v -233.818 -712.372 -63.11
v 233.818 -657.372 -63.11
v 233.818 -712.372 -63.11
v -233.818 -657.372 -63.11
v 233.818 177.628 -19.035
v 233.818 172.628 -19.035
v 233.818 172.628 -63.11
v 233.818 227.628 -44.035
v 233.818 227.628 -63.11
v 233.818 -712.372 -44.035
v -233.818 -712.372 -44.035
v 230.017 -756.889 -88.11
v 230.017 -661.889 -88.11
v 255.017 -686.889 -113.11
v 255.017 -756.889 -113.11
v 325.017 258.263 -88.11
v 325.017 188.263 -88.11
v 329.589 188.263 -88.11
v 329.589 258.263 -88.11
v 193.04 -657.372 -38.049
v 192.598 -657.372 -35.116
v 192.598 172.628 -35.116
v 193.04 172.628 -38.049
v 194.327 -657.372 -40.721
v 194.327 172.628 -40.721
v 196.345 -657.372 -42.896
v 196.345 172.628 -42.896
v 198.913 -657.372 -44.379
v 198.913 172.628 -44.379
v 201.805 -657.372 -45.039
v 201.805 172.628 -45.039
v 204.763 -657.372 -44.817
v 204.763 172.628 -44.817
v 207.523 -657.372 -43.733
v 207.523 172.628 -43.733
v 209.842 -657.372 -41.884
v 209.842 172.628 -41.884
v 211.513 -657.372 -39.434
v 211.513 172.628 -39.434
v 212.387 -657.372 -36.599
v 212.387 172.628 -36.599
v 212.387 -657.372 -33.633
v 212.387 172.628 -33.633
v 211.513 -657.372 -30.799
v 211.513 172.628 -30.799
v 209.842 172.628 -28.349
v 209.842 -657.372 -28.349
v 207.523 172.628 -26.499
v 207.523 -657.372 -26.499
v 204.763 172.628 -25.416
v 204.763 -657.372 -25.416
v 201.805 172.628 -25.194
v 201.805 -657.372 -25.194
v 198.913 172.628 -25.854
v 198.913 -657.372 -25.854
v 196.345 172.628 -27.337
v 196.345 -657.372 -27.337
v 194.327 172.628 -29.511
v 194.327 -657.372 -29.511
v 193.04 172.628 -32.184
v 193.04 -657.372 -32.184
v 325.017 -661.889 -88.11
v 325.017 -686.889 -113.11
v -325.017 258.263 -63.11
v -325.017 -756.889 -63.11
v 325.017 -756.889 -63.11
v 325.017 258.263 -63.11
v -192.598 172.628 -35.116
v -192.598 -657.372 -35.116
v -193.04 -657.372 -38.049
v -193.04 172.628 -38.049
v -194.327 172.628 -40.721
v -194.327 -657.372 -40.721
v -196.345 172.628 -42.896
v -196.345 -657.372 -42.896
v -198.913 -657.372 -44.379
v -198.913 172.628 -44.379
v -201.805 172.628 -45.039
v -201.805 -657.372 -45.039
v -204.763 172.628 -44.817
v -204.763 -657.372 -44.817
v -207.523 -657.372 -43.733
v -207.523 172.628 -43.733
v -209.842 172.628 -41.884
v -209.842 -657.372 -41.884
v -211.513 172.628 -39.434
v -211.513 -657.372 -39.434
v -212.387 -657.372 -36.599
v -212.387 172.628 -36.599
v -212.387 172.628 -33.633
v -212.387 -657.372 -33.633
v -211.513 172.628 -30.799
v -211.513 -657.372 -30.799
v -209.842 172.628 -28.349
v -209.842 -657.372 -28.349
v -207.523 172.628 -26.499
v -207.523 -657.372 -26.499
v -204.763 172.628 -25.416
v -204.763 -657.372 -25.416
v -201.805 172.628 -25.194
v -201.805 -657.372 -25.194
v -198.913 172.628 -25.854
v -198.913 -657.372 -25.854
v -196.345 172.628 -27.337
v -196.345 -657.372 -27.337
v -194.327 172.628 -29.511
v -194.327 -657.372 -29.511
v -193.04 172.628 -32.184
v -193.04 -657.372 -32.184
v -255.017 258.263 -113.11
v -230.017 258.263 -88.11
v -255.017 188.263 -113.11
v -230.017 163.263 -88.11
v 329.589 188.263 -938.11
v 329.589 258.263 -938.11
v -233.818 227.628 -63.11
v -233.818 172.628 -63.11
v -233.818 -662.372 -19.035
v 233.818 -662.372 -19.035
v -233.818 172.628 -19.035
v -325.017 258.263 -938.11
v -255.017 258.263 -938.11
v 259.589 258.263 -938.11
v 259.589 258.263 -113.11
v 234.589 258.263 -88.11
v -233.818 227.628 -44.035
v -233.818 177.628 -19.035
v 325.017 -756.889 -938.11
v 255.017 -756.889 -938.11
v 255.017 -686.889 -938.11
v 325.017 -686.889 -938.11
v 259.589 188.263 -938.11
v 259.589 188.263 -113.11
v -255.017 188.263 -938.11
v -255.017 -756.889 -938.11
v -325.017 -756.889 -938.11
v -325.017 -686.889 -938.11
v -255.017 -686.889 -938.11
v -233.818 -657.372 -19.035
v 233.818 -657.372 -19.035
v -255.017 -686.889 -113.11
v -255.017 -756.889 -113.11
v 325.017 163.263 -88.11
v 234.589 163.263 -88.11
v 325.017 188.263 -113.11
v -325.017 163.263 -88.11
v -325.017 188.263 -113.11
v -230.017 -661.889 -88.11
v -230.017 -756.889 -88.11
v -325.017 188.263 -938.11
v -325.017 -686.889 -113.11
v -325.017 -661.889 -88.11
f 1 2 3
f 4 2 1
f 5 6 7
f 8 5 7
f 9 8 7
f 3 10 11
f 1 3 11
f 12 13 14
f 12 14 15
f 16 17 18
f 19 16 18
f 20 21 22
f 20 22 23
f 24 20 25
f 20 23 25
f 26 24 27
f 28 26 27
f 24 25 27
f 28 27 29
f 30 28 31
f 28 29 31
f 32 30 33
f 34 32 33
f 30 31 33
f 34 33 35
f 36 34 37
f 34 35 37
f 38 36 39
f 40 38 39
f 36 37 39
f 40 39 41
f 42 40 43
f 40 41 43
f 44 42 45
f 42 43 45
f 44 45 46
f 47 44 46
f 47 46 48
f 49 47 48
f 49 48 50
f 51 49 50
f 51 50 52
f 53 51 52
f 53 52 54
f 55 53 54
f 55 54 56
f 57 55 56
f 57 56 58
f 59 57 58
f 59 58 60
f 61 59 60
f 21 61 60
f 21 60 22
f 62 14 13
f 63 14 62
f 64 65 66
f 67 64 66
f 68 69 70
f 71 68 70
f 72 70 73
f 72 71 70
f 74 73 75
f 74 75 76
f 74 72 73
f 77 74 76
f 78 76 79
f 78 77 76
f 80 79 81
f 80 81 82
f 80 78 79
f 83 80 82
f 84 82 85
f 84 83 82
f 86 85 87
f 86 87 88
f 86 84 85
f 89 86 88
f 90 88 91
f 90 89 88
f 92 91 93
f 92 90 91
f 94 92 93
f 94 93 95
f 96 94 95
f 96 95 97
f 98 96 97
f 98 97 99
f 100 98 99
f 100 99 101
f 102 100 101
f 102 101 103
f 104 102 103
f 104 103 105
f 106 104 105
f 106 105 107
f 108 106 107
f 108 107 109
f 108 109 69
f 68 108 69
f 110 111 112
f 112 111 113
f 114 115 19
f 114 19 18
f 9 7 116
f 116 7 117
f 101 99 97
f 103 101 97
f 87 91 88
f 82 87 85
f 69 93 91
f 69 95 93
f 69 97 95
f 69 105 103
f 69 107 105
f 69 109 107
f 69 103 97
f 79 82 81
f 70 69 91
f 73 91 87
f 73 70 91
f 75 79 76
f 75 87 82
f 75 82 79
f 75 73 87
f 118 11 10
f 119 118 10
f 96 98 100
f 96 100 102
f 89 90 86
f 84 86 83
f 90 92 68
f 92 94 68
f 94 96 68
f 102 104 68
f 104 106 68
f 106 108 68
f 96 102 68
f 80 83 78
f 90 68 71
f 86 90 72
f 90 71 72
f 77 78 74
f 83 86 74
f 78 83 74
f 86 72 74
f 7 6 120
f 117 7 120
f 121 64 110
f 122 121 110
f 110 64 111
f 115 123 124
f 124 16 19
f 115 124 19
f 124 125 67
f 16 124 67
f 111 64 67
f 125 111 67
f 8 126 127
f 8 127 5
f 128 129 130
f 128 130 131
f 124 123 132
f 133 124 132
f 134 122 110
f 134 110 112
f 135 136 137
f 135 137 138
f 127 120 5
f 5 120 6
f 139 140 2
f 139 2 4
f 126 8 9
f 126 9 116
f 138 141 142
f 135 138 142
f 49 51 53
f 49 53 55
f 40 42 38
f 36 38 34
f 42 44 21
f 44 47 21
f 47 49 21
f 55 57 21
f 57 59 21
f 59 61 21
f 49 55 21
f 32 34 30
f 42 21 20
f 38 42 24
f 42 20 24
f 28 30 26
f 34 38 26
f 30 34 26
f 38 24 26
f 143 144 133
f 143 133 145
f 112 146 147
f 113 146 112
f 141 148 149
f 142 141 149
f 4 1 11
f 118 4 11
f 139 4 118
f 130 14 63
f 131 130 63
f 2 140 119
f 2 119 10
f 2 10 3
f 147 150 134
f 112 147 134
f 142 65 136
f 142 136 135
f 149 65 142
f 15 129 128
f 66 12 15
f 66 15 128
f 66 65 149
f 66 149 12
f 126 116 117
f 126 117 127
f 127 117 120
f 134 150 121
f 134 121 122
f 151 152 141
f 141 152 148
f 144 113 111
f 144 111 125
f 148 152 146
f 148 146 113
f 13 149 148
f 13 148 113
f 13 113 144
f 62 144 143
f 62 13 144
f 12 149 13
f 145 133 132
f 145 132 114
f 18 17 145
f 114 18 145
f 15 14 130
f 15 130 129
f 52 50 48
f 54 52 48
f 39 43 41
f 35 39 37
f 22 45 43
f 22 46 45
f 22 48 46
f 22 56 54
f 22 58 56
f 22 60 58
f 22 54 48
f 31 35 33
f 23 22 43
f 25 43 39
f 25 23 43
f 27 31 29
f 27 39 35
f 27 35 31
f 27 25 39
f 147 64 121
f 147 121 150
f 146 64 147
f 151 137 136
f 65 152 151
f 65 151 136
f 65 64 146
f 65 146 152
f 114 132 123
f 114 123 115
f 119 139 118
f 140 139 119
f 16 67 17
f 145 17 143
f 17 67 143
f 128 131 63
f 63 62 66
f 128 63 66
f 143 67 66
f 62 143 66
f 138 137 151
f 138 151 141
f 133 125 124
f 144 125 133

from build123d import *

# Parameters (mm, degrees)
F0_R      = 9.95
F7_DEPTH  = 55
F8_SIZE2  = 25
F8_SIZE   = 50
F10_W     = 650.0343084335
F10_H     = 1015.1521861553
F11_DEPTH = 25
F12_W     = 70
F12_H     = 70
F13_DEPTH = 850
F14_SIZE  = 25


with BuildPart() as f4:
    # F4: sweep along a path in F3
    with BuildLine(Plane.YZ.offset(-202.5484293699)) as f4_path:
        Line((-657.3717359189, -35.4168222417), (0, -35.4168222417))
        Line((0, -35.4168222417), (172.6282640811, -35.4168222417))
    # F0 (on Front) → F4 (sweep)
    with BuildSketch(Plane.XZ):
        with Locations((-202.5484293699, -35.1164080203)):
            Circle(F0_R)
    sweep(path=f4_path.line)


with BuildPart() as f5_1:
    # F5: instance of F4
    add(f4.part.mirror(Plane.YZ))


with BuildPart() as f7:
    # F6 (on face) → F7 (new body)
    with BuildSketch(Plane(origin=(0, 172.6282640811, 0), x_dir=(-1, 0, 0), z_dir=(0, 1, 0))):
        Polygon((0, -19.0347600728), (-233.8182926178, -19.0347600728), (-233.8182926178, -63.1103813648), (0, -63.1103813648), (233.8182926178, -63.1103813648), (233.8182926178, -19.0347600728), align=None)
    extrude(amount=F7_DEPTH)

    # F8
    f8_edges = [f7.edges().sort_by_distance(p)[0] for p in [
        (0, 227.628264, -19.03476),
    ]]
    f8_side = f7.faces().sort_by_distance((0, 200.128264, -19.03476))[0]
    chamfer(f8_edges, length=F8_SIZE, length2=F8_SIZE2, reference=f8_side)


with BuildPart() as f9_1:
    # F9: instance of F7
    add(f7.part.mirror(Plane.XZ.offset(242.372)))


with BuildPart() as f11:
    # F10 (on face) → F11 (new body)
    with BuildSketch(Plane(origin=(0, 0, -63.1103813648), x_dir=(1, 0, 0), z_dir=(0, 0, -1))):
        with Locations((0, 249.3127137423)):
            Rectangle(F10_W, F10_H)
    extrude(amount=F11_DEPTH)

    # F12 (on face) → F13 (join)
    with BuildSketch(Plane(origin=(0, 0, -88.1103813648), x_dir=(1, 0, 0), z_dir=(0, 0, -1))):
        with Locations((290.0171542168, 721.8888068199)):
            Rectangle(F12_W, F12_H)
        with Locations((294.588688612, -223.2633793354)):
            Rectangle(F12_W, F12_H)
        with Locations((-290.0171542168, -223.2633793354)):
            Rectangle(F12_W, F12_H)
        with Locations((-290.0171542168, 721.8888068199)):
            Rectangle(F12_W, F12_H)
    extrude(amount=F13_DEPTH)

    # F14
    f14_edges = [f11.edges().sort_by_distance(p)[0] for p in [
        (-255.017154, 223.263379, -88.110381),
        (-290.017154, 188.263379, -88.110381),
        (-255.017154, -721.888807, -88.110381),
        (292.302921, 188.263379, -88.110381),
        (259.588689, 223.263379, -88.110381),
        (255.017154, -721.888807, -88.110381),
        (290.017154, -686.888807, -88.110381),
        (-290.017154, -686.888807, -88.110381),
    ]]
    chamfer(f14_edges, length=F14_SIZE)


solid = Compound([f4.part, f5_1.part, f7.part, f9_1.part, f11.part])
